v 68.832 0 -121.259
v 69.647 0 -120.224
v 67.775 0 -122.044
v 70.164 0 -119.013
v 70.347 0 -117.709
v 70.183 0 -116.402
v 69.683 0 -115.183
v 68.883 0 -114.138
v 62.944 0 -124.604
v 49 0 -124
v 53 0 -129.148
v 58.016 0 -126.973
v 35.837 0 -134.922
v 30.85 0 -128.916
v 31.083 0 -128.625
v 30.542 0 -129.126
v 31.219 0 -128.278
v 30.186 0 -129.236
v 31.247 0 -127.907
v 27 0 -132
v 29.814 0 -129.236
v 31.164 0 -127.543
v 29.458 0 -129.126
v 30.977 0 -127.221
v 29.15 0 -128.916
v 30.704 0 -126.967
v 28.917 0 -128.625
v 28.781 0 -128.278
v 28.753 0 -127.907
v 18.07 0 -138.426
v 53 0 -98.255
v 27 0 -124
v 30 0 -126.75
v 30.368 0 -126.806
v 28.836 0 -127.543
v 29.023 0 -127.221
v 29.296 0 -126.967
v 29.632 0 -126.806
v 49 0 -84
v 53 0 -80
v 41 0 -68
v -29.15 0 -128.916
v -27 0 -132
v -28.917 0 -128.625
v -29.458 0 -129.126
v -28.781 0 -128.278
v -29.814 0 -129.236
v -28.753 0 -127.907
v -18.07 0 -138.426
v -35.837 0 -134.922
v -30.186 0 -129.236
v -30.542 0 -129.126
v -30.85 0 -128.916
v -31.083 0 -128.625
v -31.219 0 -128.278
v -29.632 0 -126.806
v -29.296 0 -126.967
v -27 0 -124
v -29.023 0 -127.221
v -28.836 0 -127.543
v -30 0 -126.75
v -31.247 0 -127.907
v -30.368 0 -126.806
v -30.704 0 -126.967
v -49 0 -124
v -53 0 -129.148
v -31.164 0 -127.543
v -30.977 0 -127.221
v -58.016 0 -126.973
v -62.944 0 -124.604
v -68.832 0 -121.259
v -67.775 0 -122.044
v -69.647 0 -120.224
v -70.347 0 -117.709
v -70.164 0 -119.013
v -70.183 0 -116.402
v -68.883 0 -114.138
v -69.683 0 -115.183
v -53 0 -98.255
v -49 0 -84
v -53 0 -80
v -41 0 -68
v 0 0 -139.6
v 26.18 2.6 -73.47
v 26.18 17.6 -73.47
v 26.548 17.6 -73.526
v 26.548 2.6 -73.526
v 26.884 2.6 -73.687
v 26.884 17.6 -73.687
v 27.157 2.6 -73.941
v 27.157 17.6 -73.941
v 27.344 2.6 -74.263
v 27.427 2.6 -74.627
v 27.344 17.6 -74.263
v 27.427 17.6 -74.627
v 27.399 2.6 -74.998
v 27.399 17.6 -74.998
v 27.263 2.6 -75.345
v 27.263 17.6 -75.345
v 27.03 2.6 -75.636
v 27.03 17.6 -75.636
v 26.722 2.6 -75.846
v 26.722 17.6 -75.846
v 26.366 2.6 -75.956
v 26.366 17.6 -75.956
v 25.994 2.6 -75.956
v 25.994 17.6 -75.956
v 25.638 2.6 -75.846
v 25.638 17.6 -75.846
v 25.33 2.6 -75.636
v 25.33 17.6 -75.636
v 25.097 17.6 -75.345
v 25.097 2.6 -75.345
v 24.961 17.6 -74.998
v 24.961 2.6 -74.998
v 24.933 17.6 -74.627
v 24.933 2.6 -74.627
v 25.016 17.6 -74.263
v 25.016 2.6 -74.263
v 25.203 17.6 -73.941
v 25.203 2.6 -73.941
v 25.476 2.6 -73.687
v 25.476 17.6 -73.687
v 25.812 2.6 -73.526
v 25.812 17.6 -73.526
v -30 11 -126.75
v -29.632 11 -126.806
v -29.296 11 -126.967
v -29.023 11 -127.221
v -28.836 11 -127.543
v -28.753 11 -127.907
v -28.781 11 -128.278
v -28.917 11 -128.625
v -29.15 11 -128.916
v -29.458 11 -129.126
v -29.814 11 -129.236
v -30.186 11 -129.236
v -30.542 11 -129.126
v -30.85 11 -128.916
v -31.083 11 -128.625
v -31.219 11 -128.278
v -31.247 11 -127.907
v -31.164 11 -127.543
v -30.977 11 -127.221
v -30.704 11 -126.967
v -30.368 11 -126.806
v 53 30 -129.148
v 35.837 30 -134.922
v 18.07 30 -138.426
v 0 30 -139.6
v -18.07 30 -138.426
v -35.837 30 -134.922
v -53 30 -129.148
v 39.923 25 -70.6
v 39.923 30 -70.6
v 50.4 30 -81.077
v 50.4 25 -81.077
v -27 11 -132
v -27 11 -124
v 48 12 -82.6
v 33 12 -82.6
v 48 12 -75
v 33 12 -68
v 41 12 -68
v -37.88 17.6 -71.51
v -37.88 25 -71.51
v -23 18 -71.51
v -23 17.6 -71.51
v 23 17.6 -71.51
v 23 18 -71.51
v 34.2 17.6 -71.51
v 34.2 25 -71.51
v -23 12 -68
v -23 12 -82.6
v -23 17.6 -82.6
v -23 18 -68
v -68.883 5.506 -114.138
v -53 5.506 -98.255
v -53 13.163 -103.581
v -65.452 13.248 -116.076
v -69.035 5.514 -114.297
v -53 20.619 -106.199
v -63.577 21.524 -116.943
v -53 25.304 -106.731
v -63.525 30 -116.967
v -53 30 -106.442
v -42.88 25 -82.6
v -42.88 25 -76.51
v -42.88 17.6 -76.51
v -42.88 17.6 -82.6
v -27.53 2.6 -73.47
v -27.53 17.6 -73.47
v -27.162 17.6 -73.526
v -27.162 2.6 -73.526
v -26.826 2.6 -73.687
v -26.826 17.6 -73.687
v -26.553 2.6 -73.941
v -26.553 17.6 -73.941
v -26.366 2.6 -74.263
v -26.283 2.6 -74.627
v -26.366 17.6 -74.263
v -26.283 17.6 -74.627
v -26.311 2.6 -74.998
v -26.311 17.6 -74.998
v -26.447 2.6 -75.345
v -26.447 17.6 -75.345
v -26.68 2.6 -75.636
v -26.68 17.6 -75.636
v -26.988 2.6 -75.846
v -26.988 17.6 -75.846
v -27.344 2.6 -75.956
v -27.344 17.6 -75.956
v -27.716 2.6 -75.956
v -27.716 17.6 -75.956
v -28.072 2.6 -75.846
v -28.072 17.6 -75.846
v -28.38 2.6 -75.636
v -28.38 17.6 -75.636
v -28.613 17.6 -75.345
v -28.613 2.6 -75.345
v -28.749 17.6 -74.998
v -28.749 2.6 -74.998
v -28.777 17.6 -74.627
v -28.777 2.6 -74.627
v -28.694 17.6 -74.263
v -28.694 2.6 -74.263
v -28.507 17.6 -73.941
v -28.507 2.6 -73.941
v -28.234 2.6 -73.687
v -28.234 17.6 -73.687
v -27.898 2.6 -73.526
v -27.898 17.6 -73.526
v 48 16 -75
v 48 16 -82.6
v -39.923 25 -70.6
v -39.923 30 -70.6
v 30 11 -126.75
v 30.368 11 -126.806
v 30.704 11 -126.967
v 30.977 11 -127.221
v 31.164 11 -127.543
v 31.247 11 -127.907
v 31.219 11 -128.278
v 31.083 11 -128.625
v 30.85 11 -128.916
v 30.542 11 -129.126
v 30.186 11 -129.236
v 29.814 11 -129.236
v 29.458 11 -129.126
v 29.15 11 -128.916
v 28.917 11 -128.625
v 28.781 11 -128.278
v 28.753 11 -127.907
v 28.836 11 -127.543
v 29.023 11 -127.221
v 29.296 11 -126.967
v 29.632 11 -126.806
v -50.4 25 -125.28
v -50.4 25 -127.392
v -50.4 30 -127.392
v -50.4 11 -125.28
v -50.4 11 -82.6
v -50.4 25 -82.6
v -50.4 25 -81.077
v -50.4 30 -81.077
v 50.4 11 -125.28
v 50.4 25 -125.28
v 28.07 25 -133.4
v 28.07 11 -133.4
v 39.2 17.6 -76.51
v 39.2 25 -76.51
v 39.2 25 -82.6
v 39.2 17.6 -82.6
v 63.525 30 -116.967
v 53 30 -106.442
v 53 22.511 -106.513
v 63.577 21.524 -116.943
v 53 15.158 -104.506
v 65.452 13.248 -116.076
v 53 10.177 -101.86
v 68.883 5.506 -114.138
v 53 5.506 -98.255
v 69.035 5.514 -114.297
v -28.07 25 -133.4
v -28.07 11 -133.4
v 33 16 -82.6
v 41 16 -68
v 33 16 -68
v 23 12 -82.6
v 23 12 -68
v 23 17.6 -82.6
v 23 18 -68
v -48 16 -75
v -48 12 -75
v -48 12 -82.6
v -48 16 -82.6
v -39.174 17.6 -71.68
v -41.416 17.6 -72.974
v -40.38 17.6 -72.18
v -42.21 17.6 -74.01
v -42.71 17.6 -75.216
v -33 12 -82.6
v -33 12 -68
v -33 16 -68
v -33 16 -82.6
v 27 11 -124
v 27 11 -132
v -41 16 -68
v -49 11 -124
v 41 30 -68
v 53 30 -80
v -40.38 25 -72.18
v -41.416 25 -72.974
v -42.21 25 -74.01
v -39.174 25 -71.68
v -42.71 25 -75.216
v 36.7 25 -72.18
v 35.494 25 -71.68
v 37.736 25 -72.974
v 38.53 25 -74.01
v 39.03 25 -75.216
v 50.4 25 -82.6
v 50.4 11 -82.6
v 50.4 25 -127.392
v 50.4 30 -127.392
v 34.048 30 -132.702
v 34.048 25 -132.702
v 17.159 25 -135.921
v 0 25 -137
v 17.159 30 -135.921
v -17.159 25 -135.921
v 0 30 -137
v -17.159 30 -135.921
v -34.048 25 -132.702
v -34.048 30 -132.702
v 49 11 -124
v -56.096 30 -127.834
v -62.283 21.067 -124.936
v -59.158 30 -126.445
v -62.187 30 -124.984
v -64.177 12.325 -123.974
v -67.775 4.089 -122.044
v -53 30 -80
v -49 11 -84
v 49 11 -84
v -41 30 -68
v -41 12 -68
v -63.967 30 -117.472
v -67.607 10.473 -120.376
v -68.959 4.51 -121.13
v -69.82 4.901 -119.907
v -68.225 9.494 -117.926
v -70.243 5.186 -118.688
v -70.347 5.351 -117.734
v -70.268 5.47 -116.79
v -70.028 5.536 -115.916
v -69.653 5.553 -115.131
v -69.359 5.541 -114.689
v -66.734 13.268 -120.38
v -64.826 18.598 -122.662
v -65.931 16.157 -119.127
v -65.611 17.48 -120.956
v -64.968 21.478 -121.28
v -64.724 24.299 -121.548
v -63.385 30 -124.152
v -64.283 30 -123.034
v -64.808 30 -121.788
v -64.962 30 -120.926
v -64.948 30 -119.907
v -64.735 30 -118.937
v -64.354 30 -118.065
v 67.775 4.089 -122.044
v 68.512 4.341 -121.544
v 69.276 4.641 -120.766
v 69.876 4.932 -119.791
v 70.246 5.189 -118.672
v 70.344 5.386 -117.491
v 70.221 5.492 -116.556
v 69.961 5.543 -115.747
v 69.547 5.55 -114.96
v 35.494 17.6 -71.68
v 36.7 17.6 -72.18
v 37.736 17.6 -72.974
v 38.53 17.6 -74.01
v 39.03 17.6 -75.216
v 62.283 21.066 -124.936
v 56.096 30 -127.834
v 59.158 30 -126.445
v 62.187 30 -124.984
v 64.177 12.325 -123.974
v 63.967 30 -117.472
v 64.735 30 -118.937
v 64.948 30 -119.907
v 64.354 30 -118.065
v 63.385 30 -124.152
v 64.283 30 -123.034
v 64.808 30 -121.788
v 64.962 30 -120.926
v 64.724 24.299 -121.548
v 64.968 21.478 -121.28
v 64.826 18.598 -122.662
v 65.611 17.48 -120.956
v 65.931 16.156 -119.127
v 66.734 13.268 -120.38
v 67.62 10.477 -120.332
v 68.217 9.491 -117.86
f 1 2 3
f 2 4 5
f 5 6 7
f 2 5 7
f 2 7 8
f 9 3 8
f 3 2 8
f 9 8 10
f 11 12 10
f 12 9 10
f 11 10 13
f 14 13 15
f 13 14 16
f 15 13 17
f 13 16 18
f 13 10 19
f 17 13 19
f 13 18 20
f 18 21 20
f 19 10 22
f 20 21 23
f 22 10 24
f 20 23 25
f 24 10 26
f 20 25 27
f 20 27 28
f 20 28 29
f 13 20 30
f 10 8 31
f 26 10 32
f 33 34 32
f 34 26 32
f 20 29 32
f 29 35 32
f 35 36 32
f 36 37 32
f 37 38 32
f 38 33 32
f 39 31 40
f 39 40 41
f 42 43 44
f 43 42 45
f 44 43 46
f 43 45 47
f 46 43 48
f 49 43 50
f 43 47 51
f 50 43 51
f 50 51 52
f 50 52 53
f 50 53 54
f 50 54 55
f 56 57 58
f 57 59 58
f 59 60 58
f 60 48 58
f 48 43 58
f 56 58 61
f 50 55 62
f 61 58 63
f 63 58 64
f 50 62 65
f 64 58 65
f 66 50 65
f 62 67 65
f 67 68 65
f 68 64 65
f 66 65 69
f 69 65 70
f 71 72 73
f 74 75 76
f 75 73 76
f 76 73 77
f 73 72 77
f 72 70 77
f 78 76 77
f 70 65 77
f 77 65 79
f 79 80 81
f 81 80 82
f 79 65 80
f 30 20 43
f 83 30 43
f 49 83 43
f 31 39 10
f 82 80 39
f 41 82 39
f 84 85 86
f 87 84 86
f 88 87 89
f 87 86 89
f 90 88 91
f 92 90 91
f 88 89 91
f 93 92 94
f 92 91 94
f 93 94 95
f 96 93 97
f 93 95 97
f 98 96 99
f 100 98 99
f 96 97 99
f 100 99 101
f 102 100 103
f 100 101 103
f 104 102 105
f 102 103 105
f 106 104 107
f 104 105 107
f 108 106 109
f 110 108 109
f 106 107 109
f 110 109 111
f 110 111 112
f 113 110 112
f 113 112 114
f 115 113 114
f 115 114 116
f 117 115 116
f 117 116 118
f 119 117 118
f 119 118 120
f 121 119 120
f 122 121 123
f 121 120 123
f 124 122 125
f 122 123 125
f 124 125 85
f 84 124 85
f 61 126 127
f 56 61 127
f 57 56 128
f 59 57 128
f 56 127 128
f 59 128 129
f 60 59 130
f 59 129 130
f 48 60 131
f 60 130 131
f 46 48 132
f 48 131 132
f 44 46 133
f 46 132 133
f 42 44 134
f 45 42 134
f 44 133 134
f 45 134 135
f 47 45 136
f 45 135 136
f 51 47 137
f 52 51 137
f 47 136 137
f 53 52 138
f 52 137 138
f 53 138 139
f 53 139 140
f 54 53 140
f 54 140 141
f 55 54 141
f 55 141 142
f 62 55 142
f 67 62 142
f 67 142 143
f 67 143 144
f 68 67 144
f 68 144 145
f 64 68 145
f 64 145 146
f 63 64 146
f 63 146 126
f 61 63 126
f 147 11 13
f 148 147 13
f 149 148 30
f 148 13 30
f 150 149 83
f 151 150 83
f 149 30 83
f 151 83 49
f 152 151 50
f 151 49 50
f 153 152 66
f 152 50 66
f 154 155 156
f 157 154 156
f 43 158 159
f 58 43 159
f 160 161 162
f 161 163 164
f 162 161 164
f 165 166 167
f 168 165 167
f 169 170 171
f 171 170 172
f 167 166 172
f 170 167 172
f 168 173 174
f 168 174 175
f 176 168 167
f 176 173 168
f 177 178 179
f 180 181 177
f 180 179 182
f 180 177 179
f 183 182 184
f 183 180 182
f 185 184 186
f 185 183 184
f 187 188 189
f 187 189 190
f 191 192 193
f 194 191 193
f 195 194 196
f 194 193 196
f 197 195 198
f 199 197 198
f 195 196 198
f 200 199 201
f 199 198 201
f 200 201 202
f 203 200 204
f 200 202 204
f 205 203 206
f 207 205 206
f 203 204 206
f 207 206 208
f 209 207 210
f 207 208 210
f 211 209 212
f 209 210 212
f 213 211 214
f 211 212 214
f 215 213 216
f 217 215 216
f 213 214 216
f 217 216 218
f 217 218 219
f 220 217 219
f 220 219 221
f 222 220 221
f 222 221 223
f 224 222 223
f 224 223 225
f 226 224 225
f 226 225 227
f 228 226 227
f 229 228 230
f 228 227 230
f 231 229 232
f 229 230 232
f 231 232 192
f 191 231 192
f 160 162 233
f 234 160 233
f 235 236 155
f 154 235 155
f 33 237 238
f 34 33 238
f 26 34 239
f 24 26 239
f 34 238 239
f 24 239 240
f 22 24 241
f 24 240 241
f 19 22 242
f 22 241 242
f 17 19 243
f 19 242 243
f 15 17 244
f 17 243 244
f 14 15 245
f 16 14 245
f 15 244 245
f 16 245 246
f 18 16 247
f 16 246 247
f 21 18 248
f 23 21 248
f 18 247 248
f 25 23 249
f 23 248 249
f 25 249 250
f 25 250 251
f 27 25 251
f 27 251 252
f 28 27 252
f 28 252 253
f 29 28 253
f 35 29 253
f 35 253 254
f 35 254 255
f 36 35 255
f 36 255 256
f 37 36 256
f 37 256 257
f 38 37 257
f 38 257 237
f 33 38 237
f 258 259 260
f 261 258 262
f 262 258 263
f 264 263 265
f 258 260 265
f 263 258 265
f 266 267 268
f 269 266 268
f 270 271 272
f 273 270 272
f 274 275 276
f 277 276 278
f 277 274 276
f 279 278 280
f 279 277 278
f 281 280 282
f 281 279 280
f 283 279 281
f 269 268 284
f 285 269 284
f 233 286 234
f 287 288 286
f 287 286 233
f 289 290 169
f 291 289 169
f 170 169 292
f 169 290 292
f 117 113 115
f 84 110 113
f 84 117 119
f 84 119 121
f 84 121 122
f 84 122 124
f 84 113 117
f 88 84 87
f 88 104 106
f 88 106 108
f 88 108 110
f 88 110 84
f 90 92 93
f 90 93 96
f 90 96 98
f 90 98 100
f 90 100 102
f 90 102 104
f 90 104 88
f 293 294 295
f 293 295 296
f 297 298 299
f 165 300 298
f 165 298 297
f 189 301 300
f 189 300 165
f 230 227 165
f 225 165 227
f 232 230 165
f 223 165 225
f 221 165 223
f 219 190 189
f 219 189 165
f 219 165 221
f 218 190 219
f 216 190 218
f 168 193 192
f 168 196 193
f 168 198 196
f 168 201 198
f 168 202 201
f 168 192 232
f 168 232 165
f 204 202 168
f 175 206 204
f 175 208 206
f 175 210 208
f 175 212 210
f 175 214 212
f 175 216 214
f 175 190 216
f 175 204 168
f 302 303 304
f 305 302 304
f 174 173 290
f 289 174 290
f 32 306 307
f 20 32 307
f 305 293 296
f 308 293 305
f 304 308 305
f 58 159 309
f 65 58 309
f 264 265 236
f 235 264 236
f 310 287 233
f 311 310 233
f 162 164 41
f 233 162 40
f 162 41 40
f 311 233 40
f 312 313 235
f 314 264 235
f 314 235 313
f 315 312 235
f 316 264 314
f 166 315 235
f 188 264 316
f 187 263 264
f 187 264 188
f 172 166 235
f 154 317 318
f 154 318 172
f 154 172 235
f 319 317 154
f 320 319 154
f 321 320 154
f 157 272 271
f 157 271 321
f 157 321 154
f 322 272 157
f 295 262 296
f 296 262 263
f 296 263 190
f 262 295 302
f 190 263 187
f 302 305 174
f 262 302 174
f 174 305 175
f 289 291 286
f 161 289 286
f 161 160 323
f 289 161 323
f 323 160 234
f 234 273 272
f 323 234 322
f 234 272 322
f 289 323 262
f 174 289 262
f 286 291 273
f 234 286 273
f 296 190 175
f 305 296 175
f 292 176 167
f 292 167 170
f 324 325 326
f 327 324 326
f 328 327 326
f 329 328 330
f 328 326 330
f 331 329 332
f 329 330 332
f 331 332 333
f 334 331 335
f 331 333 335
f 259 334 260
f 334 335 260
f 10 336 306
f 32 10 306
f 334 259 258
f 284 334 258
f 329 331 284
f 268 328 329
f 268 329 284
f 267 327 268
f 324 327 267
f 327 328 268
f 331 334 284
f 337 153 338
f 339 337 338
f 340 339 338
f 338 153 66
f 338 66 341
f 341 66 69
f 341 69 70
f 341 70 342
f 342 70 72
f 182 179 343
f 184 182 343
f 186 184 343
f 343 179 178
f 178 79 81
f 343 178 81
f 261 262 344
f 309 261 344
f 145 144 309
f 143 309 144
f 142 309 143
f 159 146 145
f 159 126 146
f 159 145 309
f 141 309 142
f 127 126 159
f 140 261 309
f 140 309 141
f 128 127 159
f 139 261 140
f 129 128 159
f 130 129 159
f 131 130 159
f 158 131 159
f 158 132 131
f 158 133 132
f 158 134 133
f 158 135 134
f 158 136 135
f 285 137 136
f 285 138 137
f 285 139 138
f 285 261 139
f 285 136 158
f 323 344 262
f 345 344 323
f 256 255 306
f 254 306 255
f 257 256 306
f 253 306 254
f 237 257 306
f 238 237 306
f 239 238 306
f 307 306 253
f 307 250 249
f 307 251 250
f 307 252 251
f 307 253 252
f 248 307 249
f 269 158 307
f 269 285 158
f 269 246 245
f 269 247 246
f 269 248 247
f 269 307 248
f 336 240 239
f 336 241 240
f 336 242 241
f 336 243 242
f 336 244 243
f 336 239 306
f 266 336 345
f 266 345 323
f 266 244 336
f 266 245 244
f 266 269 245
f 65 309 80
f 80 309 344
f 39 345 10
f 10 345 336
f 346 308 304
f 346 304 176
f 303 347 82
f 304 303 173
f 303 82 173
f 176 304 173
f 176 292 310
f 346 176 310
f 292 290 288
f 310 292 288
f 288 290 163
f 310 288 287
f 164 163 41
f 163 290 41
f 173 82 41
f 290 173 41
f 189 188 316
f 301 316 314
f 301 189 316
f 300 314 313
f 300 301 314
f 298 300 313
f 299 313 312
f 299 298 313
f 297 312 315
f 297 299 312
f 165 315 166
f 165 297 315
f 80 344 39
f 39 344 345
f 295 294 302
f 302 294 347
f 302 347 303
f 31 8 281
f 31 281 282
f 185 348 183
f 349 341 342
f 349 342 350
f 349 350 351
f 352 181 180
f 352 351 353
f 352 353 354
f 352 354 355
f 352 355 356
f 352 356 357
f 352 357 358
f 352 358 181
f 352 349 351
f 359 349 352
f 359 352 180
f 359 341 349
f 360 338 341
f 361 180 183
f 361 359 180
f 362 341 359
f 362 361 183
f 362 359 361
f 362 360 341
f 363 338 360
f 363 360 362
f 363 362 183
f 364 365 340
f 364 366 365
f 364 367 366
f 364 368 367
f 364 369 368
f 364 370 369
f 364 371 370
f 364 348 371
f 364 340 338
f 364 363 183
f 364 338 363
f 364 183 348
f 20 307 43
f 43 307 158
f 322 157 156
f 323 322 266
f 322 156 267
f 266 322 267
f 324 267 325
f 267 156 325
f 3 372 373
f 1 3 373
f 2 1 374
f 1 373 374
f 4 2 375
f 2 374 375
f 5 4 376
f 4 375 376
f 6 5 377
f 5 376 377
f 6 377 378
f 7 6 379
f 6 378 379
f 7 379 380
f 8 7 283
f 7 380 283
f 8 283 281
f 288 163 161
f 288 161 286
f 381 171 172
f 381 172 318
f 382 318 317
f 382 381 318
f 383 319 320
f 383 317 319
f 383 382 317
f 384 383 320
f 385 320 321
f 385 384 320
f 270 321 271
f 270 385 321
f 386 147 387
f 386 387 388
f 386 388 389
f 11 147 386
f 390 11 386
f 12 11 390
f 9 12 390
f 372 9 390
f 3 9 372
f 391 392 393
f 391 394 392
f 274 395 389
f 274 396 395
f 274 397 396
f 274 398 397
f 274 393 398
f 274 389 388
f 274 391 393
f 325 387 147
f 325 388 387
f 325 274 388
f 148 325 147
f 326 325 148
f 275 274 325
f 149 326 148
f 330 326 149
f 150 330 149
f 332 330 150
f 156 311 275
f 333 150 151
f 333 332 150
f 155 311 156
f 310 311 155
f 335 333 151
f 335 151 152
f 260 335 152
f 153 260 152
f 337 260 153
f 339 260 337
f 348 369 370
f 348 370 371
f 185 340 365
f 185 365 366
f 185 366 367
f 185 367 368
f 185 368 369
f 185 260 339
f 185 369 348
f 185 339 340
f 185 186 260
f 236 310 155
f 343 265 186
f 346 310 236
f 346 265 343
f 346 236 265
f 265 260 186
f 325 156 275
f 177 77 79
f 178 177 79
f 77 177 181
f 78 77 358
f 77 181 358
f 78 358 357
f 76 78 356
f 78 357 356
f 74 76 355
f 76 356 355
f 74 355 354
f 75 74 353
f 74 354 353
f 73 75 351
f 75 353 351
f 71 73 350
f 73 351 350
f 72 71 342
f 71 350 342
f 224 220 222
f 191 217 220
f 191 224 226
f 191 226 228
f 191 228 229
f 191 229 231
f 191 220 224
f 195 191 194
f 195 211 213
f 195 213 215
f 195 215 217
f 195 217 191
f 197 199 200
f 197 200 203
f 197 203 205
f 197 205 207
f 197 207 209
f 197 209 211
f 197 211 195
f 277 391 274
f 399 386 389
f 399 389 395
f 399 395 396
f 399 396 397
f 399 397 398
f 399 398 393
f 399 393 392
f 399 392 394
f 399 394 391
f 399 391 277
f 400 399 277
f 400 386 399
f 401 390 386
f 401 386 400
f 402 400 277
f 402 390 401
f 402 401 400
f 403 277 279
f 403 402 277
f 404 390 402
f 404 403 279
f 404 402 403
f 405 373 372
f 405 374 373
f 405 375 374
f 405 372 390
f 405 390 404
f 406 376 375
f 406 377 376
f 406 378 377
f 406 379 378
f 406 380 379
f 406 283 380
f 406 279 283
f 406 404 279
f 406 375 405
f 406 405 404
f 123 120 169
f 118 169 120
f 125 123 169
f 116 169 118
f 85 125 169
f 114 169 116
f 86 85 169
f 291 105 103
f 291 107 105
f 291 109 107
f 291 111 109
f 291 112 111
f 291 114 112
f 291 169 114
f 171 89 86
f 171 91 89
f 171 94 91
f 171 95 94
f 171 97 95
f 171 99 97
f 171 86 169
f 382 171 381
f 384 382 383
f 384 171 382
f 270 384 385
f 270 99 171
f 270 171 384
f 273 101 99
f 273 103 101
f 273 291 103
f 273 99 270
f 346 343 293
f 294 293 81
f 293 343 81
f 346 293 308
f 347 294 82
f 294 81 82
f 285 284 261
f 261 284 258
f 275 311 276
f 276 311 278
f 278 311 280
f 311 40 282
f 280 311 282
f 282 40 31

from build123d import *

# Parameters (mm, degrees)
BOSS_EXTRUDE1_DEPTH = 30
CUT_EXTRUDE1_REACH  = 154.306
CUT_EXTRUDE2_DEPTH  = 19
SKETCH5_W           = 82.08
SKETCH5_H           = 54.14
CUT_EXTRUDE4_DEPTH  = 12.4
SKETCH4_R           = 1.25
CUT_EXTRUDE3_DEPTH  = 15
FILLET1_R           = 5
CUT_EXTRUDE5_DEPTH  = 5
BOSS_EXTRUDE2_DEPTH = 30
CUT_EXTRUDE6_REACH  = 160.176
SKETCH8_R           = 38
CUT_EXTRUDE7_REACH  = 179.588
SKETCH9_R           = 38
FILLET2_R           = 5
CUT_EXTRUDE8_REACH  = 106.763
SKETCH10_W          = 15
SKETCH10_H          = 4
SKETCH10_W_2        = 46
SKETCH10_H_2        = 6
CUT_EXTRUDE9_REACH  = 159.473
SKETCH11_R          = 1.25


with BuildPart() as part:
    # Sketch1 → Boss-Extrude1 (new body)
    with BuildSketch(Plane(origin=(0, 0, 0), x_dir=(1, 0, 0), z_dir=(0, 1, 0))):
        with BuildLine():
            Line((53, 80), (53, 129.147822281))
            ThreePointArc((53, 129.147822281), (0, 139.6), (-53, 129.147822281))
            Line((-53, 129.147822281), (-53, 80))
            Line((-53, 80), (-41, 68))
            Line((-41, 68), (41, 68))
            Line((41, 68), (53, 80))
        make_face()
    extrude(amount=BOSS_EXTRUDE1_DEPTH)

    # Sketch2 → Cut-Extrude1 (cut, up to next)
    with BuildSketch(Plane(origin=(0, 30, 0), x_dir=(1, 0, 0), z_dir=(0, 1, 0)), mode=Mode.PRIVATE) as cut_extrude1_sk1:
        Polygon((-49, 84), (49, 84), (49, 124), (27, 124), (27, 132), (-27, 132), (-27, 124), (-49, 124), align=None)
    cut_extrude1_tool1 = extrude(cut_extrude1_sk1.sketch, amount=-CUT_EXTRUDE1_REACH, mode=Mode.PRIVATE) & part.part
    add(cut_extrude1_tool1.solids().sort_by_distance((0, 30, -106.382353))[0], mode=Mode.SUBTRACT)

    # Sketch3 → Cut-Extrude2 (cut)
    with BuildSketch(Plane(origin=(0, 30, 0), x_dir=(1, 0, 0), z_dir=(0, 1, 0))):
        Polygon((-50.4, 125.280170906), (-50.4, 82.6), (50.4, 82.6), (50.4, 125.280170906), (28.070469991, 133.4), (-28.070469991, 133.4), align=None)
    extrude(amount=-CUT_EXTRUDE2_DEPTH, mode=Mode.SUBTRACT)

    # Sketch5 → Cut-Extrude4 (cut)
    with BuildSketch(Plane(origin=(0, 30, 0), x_dir=(1, 0, 0), z_dir=(0, 1, 0))):
        with Locations((-1.84, 98.58)):
            Rectangle(SKETCH5_W, SKETCH5_H)
    extrude(amount=-CUT_EXTRUDE4_DEPTH, mode=Mode.SUBTRACT)

    # Sketch4 → Cut-Extrude3 (cut)
    with BuildSketch(Plane(origin=(0, 17.6, 0), x_dir=(1, 0, 0), z_dir=(0, 1, 0))):
        with Locations(Location((26.18, 74.72, 0), (0, 0, 270))):
            Circle(SKETCH4_R)
        with Locations(Location((-27.53, 74.72, 0), (0, 0, 270))):
            Circle(SKETCH4_R)
    extrude(amount=-CUT_EXTRUDE3_DEPTH, mode=Mode.SUBTRACT)

    # Fillet1
    fillet1_edges = [part.edges().sort_by_distance(p)[0] for p in [
        (-42.88, 23.8, -71.51),
        (39.2, 23.8, -71.51),
    ]]
    fillet(fillet1_edges, radius=FILLET1_R)

    # Sketch6 → Cut-Extrude5 (cut)
    with BuildSketch(Plane(origin=(0, 30, 0), x_dir=(1, 0, 0), z_dir=(0, 1, 0))):
        with BuildLine():
            Line((50.4, 81.076955262), (50.4, 127.392464455))
            ThreePointArc((50.4, 127.392464455), (0, 137), (-50.4, 127.392464455))
            Line((-50.4, 127.392464455), (-50.4, 81.076955262))
            Line((-50.4, 81.076955262), (-39.923044738, 70.6))
            Line((-39.923044738, 70.6), (39.923044738, 70.6))
            Line((39.923044738, 70.6), (50.4, 81.076955262))
        make_face()
    extrude(amount=-CUT_EXTRUDE5_DEPTH, mode=Mode.SUBTRACT)

    # Sketch7 → Boss-Extrude2 (add)
    with BuildSketch(Plane.XZ):
        with BuildLine():
            Line((73.456296502, -118.711130498), (53, -98.254833996))
            Line((53, -98.254833996), (53, -129.147822281))
            ThreePointArc((53, -129.147822281), (63.443123072, -124.350834878), (73.456296502, -118.711130498))
        make_face()
    boss_extrude2 = extrude(amount=-BOSS_EXTRUDE2_DEPTH)

    # Cut-Extrude6: up to this plane
    cut_extrude6_end = Plane(origin=(53, 30, -80), z_dir=(-1, 0, 0))
    # Sketch8 → Cut-Extrude6 (cut, up to the surface)
    with BuildSketch(Plane(origin=(96.0837135, 0, -96.0837135), x_dir=(0, -1, 0), z_dir=(-0.7071067811865488, 0, 0.7071067811865464)), mode=Mode.PRIVATE) as cut_extrude6_sk1:
        with Locations((-26, 0)):
            Circle(SKETCH8_R)
    cut_extrude6_tool1 = split(extrude(cut_extrude6_sk1.sketch, amount=CUT_EXTRUDE6_REACH, mode=Mode.PRIVATE), bisect_by=cut_extrude6_end, keep=Keep.BOTH, mode=Mode.PRIVATE)
    add(cut_extrude6_tool1.solids().sort_by_distance((96.083714, 26, -96.083714))[0], mode=Mode.SUBTRACT)

    # Mirror1: Boss-Extrude2 across plane
    add(boss_extrude2.mirror(Plane(origin=(0, 0, 0), x_dir=(0, 0, 1), z_dir=(1, 0, 0))))

    # Cut-Extrude7: up to this plane
    cut_extrude7_end = Plane(origin=(-53, 30, -129.147822281), z_dir=(1, 0, 0))
    # Sketch9 → Cut-Extrude7 (cut, up to the surface)
    with BuildSketch(Plane(origin=(-96.0837135, 0, -96.0837135), x_dir=(0, -1, 0), z_dir=(0.7071067811865488, 0, 0.7071067811865464)), mode=Mode.PRIVATE) as cut_extrude7_sk1:
        with Locations((-26, 0)):
            Circle(SKETCH9_R)
    cut_extrude7_tool1 = split(extrude(cut_extrude7_sk1.sketch, amount=CUT_EXTRUDE7_REACH, mode=Mode.PRIVATE), bisect_by=cut_extrude7_end, keep=Keep.BOTH, mode=Mode.PRIVATE)
    add(cut_extrude7_tool1.solids().sort_by_distance((-96.083714, 26, -96.083714))[0], mode=Mode.SUBTRACT)

    # Fillet2
    fillet2_edges = [part.edges().sort_by_distance(p)[0] for p in [
        (68.992680179, 17.464833723, -121.359672387),
        (73.456296502, 2.753049234, -118.711130498),
        (-73.456296502, 2.753049234, -118.711130498),
        (-68.992679253, 17.464838179, -121.359672914),
    ]]
    fillet(fillet2_edges, radius=FILLET2_R - 0.0001)  # a hair under: the kernel refuses the full size

    # Sketch10 → Cut-Extrude8 (cut, up to next)
    with BuildSketch(Plane.XY.offset(-68), mode=Mode.PRIVATE) as cut_extrude8_sk1:
        with Locations((-40.5, 14)):
            Rectangle(SKETCH10_W, SKETCH10_H)
    cut_extrude8_tool1 = extrude(cut_extrude8_sk1.sketch, amount=-CUT_EXTRUDE8_REACH, mode=Mode.PRIVATE) & part.part
    # Sketch10 → Cut-Extrude8 (cut, up to next)
    with BuildSketch(Plane.XY.offset(-68), mode=Mode.PRIVATE) as cut_extrude8_sk2:
        with Locations((0, 15)):
            Rectangle(SKETCH10_W_2, SKETCH10_H_2)
    cut_extrude8_tool2 = extrude(cut_extrude8_sk2.sketch, amount=-CUT_EXTRUDE8_REACH, mode=Mode.PRIVATE) & part.part
    # Sketch10 → Cut-Extrude8 (cut, up to next)
    with BuildSketch(Plane.XY.offset(-68), mode=Mode.PRIVATE) as cut_extrude8_sk3:
        with Locations((40.5, 14)):
            Rectangle(SKETCH10_W, SKETCH10_H)
    cut_extrude8_tool3 = extrude(cut_extrude8_sk3.sketch, amount=-CUT_EXTRUDE8_REACH, mode=Mode.PRIVATE) & part.part
    add(cut_extrude8_tool1.solids().sort_by_distance((-40.5, 14, -68))[0], mode=Mode.SUBTRACT)
    add(cut_extrude8_tool2.solids().sort_by_distance((0, 15, -68))[0], mode=Mode.SUBTRACT)
    add(cut_extrude8_tool3.solids().sort_by_distance((40.5, 14, -68))[0], mode=Mode.SUBTRACT)

    # Sketch11 → Cut-Extrude9 (cut, up to next)
    with BuildSketch(Plane(origin=(0, 11, 0), x_dir=(1, 0, 0), z_dir=(0, 1, 0)), mode=Mode.PRIVATE) as cut_extrude9_sk1:
        with Locations(Location((-30, 128, 0), (0, 0, 270))):
            Circle(SKETCH11_R)
    cut_extrude9_tool1 = extrude(cut_extrude9_sk1.sketch, amount=-CUT_EXTRUDE9_REACH, mode=Mode.PRIVATE) & part.part
    # Sketch11 → Cut-Extrude9 (cut, up to next)
    with BuildSketch(Plane(origin=(0, 11, 0), x_dir=(1, 0, 0), z_dir=(0, 1, 0)), mode=Mode.PRIVATE) as cut_extrude9_sk2:
        with Locations(Location((30, 128, 0), (0, 0, 270))):
            Circle(SKETCH11_R)
    cut_extrude9_tool2 = extrude(cut_extrude9_sk2.sketch, amount=-CUT_EXTRUDE9_REACH, mode=Mode.PRIVATE) & part.part
    add(cut_extrude9_tool1.solids().sort_by_distance((-30, 11, -128))[0], mode=Mode.SUBTRACT)
    add(cut_extrude9_tool2.solids().sort_by_distance((30, 11, -128))[0], mode=Mode.SUBTRACT)


solid = part.part
